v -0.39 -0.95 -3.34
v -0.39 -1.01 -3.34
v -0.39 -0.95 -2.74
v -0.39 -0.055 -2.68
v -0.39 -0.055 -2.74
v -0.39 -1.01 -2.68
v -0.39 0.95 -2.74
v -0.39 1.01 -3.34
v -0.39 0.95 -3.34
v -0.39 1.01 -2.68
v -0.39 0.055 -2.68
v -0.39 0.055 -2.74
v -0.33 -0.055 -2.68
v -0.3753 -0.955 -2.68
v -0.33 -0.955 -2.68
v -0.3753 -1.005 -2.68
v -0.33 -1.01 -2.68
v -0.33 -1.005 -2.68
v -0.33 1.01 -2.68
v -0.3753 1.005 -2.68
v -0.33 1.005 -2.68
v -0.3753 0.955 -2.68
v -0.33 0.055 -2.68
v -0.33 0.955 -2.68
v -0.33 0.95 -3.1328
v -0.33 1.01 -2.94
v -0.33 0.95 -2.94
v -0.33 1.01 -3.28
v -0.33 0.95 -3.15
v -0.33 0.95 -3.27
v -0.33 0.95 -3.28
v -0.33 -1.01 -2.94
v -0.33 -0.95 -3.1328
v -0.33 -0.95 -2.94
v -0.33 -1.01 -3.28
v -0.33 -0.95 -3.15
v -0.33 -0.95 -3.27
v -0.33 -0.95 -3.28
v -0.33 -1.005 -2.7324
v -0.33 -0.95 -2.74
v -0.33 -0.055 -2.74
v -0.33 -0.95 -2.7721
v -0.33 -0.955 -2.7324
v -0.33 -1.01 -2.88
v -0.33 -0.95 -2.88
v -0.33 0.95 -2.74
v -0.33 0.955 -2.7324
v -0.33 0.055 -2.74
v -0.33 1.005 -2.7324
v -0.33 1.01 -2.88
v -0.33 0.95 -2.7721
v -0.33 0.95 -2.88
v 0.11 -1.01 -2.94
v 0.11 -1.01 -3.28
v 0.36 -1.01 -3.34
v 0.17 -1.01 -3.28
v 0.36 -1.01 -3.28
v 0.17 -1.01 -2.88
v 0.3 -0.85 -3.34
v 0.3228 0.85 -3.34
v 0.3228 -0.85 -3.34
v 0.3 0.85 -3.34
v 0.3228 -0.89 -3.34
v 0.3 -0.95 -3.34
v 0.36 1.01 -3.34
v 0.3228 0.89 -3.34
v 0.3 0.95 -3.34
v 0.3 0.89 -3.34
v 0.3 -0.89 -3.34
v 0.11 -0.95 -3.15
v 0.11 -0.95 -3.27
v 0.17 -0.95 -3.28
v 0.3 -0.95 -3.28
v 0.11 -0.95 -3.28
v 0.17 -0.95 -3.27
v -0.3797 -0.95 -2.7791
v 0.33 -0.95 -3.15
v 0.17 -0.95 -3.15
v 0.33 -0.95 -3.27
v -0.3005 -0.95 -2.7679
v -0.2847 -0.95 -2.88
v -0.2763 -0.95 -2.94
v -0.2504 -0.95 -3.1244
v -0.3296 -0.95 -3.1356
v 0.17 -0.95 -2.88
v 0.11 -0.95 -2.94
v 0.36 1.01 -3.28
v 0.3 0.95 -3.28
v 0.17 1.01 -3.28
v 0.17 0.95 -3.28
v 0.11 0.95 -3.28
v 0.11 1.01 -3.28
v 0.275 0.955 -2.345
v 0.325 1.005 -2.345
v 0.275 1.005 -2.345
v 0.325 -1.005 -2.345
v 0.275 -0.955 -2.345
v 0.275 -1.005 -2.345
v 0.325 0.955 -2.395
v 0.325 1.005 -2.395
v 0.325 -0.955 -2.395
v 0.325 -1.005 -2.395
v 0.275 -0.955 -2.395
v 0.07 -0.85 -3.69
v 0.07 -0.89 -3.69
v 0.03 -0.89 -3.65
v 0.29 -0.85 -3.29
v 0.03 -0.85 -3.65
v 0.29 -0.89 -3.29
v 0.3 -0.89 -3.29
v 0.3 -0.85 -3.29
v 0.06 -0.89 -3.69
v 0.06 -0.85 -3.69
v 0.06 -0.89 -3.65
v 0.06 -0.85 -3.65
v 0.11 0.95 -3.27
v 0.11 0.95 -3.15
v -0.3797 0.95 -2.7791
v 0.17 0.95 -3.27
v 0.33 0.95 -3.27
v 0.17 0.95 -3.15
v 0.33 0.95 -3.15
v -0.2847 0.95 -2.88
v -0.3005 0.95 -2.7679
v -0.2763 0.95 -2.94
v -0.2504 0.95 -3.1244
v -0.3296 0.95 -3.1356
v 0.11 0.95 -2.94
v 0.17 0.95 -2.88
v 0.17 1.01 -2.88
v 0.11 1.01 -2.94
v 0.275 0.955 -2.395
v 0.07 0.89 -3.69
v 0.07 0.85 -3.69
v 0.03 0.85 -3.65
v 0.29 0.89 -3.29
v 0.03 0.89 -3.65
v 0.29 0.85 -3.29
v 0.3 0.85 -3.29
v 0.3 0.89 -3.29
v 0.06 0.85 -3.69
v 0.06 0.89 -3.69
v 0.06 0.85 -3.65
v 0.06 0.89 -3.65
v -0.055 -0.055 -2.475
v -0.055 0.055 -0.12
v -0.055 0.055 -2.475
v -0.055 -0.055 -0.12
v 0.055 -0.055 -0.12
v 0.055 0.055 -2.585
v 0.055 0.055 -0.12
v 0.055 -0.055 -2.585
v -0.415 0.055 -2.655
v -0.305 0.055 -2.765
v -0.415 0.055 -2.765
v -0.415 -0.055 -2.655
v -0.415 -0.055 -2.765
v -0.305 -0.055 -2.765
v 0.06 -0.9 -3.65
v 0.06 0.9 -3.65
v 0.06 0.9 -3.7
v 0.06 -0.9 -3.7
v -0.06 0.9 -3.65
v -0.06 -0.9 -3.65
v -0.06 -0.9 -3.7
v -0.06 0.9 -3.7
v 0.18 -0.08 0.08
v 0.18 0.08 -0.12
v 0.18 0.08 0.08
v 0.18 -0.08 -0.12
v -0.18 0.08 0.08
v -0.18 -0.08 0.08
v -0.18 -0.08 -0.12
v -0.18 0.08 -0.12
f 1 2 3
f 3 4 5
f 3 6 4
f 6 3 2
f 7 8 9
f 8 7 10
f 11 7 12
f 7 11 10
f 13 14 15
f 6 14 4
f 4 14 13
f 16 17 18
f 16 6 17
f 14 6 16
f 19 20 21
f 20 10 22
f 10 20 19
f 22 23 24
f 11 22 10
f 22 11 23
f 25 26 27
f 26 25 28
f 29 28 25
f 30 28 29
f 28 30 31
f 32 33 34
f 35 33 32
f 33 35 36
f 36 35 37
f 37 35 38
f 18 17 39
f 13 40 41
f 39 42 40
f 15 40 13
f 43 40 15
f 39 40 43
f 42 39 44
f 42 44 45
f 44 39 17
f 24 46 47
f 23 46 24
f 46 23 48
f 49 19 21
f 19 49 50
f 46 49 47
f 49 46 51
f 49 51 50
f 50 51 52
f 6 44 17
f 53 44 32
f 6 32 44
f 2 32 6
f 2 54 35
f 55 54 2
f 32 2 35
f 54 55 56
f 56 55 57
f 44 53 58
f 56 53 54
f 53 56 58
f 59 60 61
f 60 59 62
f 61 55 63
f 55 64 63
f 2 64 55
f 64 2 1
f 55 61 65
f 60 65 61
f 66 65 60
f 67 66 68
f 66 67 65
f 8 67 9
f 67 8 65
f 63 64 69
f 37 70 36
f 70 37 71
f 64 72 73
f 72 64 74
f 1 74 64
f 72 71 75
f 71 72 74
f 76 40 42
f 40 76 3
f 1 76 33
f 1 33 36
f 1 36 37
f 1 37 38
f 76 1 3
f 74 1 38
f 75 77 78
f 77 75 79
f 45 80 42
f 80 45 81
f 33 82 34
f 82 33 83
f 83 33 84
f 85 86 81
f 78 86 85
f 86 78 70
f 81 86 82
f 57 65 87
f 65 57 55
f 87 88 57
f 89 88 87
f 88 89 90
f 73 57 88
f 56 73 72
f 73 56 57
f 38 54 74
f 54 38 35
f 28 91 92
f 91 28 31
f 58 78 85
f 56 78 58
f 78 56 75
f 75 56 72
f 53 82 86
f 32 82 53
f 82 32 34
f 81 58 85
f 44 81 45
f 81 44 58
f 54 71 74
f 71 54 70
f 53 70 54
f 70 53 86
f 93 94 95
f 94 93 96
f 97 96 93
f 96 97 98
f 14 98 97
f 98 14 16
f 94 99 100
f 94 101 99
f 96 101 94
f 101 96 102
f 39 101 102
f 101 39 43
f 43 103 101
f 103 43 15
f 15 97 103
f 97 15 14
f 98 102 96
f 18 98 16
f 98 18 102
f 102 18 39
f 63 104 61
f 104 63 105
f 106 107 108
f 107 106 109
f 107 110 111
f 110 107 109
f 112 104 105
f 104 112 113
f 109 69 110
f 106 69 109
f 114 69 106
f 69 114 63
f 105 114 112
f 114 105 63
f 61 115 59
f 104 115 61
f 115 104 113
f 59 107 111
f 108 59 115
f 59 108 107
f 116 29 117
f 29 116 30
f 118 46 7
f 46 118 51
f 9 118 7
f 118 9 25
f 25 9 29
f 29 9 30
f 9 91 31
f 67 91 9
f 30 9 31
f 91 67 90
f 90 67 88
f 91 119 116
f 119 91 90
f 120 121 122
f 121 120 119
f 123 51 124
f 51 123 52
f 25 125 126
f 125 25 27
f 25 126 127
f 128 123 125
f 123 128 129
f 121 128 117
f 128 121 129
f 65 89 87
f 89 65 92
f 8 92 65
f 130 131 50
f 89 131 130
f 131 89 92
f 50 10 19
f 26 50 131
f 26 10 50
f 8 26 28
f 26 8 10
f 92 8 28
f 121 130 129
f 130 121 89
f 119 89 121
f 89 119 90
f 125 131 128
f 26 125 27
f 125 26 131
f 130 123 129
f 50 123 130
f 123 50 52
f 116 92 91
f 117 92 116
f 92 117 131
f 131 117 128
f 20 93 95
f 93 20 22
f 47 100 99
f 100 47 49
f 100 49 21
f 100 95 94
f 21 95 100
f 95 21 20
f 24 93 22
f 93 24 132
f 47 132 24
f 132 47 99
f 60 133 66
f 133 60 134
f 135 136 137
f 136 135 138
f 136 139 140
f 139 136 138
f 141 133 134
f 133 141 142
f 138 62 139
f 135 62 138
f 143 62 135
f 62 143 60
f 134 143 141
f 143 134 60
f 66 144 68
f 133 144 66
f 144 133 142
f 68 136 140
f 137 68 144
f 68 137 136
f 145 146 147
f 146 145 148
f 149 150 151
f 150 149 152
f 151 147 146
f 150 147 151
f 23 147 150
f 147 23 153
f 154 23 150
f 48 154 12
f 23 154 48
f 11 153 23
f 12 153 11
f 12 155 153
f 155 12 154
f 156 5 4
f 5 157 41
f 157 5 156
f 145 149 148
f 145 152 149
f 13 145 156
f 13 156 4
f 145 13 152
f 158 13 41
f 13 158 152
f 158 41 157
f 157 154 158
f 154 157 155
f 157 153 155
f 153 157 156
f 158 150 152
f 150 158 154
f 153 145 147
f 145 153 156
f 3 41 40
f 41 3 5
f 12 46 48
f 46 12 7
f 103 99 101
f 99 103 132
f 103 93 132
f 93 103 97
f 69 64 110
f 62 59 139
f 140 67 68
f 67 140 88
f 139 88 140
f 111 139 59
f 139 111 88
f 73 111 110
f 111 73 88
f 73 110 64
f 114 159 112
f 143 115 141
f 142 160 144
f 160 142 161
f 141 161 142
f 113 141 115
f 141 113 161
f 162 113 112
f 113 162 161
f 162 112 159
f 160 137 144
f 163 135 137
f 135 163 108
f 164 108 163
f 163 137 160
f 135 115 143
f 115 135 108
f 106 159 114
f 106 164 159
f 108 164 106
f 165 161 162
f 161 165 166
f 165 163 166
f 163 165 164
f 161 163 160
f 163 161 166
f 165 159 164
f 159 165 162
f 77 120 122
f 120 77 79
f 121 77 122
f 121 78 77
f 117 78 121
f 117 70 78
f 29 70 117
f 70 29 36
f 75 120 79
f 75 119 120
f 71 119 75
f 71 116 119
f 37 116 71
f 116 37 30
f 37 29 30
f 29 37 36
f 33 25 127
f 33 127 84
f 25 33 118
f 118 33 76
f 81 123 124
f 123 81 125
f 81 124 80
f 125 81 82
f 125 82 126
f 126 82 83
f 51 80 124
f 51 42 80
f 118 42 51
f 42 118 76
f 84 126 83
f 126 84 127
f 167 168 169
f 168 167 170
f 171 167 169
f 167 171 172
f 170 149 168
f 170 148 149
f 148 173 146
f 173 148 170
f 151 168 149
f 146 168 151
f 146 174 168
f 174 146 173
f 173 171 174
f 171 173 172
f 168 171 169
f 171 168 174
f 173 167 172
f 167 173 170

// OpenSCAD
// file: lib/chair_kit.scad
// Chair kit — the chairlift chair shared by the double, quad, and 6-pack
// (chair.scad, chair_quad.scad, chair_6pack.scad), which differ in width,
// cushion colour, and hanger weight.
//
//     +X = forward (direction the chair travels along the cable)
//     +Y = seat width (lateral, perpendicular to cable)
//     +Z = up
//
// The origin is the cable-attachment point and the chair hangs in -Z. A
// grip clamps the cable; a hanger drops behind the riders to a yoke over
// the backrest; side frames carry the seat, armrests, and a restraint bar
// (shown raised); a footrest hangs under the riders' feet. Riders are
// placed by the slots with their feet on the footrest, which hangs
// cable_h below the cable: the cable's height at a station
// (world.BullwheelHeight), so at the bullwheel a rider's skis are on the
// snow as the chair picks them up or sets them down. Everything else
// hangs from the seat height that gives.
//
// Conventions, units, and axis docs: see models-src/README.md.

$fn = 10;

// ── Shared dimensions (metres) ─────────────────────────────────────────
cable_h       = 3.65;  // world.BullwheelHeight
chair_depth   = 0.66;  // seat front to back (X)
foot_top_z    = -cable_h;          // footrest top: where riders' feet go (the slots)
seat_top_z    = foot_top_z + 0.50; // top of the seat cushion
seat_cushion  = 0.12;
seat_frame_z  = seat_top_z - seat_cushion - 0.04; // bar under the cushion
back_x        = -chair_depth / 2;                 // back edge of the seat
back_bot_z    = seat_top_z + 0.02;
back_top_z    = seat_top_z + 0.38;
back_cushion  = 0.08;
yoke_z        = seat_top_z + 0.44; // the bar over the backrest
restraint_z   = seat_top_z + 0.78; // the raised restraint bar, clear of riders' heads
grip_len      = 0.36;
foot_x        = 0;     // under the riders, at the slots' X
bar          = 0.06;   // frame tube section
frame_color   = [0.24, 0.26, 0.29];
grip_color    = [0.55, 0.57, 0.60];

// A box between two points, `s` thick: a frame tube.
module tube(a, b, s = bar) {
    hull() {
        translate(a) cube(s, center = true);
        translate(b) cube(s, center = true);
    }
}

// ── The chair ──────────────────────────────────────────────────────────
// w: seat width; cushion: seat and backrest colour; hanger: hanger section.
module chair(w, cushion, hanger = 0.10) {
    half = w / 2;
    ex = half + 0.03; // side frames, just outside the seat

    // Grip on the cable.
    color(grip_color)
        translate([0, 0, -0.02])
            cube([grip_len, 0.16, 0.20], center = true);

    color(frame_color) {
        // Hanger: down from the grip, then back over the riders' heads to
        // the yoke.
        tube([0, 0, -0.08], [0, 0, yoke_z + 0.18], hanger);
        tube([0, 0, yoke_z + 0.18], [back_x - 0.03, 0, yoke_z], hanger);
        // Yoke over the backrest, the full width.
        tube([back_x - 0.03, -ex, yoke_z], [back_x - 0.03, ex, yoke_z]);
        for (s = [-1, 1]) {
            y = s * ex;
            // Side frame: down the back, then forward under the seat.
            tube([back_x - 0.03, y, yoke_z], [back_x - 0.03, y, seat_frame_z]);
            tube([back_x - 0.03, y, seat_frame_z], [-back_x, y, seat_frame_z]);
            // Armrest with a post at its front.
            tube([back_x - 0.03, y, seat_top_z + 0.24], [0.14, y, seat_top_z + 0.24]);
            tube([0.14, y, seat_top_z + 0.24], [0.14, y, seat_frame_z]);
            // Restraint bar arm, raised: from the yoke up and forward.
            tube([back_x - 0.03, y, yoke_z], [0.30, y, restraint_z], 0.05);
            // Footrest hanger from the front of the seat.
            tube([-back_x - 0.02, s * (half - 0.08), seat_frame_z],
                 [foot_x + 0.05, s * (half - 0.08), foot_top_z - 0.02], 0.04);
        }
        // Restraint bar across the front, raised clear of the riders.
        tube([0.30, -ex, restraint_z], [0.30, ex, restraint_z], 0.05);
        // Cross tube under the front of the seat.
        tube([-back_x, -ex, seat_frame_z], [-back_x, ex, seat_frame_z]);
        // Footrest: the riders stand their skis on it.
        translate([foot_x, 0, foot_top_z - 0.025])
            cube([0.12, w - 0.1, 0.05], center = true);
    }

    color(cushion) {
        // Seat cushion.
        translate([0, 0, seat_top_z - seat_cushion / 2])
            cube([chair_depth, w, seat_cushion], center = true);
        // Backrest cushion, leaning back a touch.
        translate([back_x + back_cushion / 2, 0, back_bot_z])
            rotate([0, -8, 0])
                translate([0, 0, (back_top_z - back_bot_z) / 2])
                    cube([back_cushion, w, back_top_z - back_bot_z], center = true);
    }
}
// main file
// Chairlift chair — a fixed-grip triple, built from the chair kit
// (lib/chair_kit.scad).
//
// Conventions, units, and axis docs: see models-src/README.md.

include <lib/chair_kit.scad>

seat_w = 1.90; // 3-person, real-world triples run 1.8–2.0 m wide

chair(seat_w, [0.20, 0.52, 0.32], hanger = 0.11);

// ── Passenger seat anchors ─────────────────────────────────────────────
// Three slots across the seat, 0.60 m centre-to-centre like the quad,
// leaving 0.35 m to each outer edge. scad2obj captures these as `# slot`
// comment lines in chair_triple.obj (already converted to game coords).
slot_x       = 0;           // centred along seat depth
slot_outer_y = 0.60;
slot_z       = foot_top_z;  // top of the footrest

echo("MOGUL_META", "slot", 0, slot_x, -slot_outer_y, slot_z);
echo("MOGUL_META", "slot", 1, slot_x, 0, slot_z);
echo("MOGUL_META", "slot", 2, slot_x,  slot_outer_y, slot_z);
